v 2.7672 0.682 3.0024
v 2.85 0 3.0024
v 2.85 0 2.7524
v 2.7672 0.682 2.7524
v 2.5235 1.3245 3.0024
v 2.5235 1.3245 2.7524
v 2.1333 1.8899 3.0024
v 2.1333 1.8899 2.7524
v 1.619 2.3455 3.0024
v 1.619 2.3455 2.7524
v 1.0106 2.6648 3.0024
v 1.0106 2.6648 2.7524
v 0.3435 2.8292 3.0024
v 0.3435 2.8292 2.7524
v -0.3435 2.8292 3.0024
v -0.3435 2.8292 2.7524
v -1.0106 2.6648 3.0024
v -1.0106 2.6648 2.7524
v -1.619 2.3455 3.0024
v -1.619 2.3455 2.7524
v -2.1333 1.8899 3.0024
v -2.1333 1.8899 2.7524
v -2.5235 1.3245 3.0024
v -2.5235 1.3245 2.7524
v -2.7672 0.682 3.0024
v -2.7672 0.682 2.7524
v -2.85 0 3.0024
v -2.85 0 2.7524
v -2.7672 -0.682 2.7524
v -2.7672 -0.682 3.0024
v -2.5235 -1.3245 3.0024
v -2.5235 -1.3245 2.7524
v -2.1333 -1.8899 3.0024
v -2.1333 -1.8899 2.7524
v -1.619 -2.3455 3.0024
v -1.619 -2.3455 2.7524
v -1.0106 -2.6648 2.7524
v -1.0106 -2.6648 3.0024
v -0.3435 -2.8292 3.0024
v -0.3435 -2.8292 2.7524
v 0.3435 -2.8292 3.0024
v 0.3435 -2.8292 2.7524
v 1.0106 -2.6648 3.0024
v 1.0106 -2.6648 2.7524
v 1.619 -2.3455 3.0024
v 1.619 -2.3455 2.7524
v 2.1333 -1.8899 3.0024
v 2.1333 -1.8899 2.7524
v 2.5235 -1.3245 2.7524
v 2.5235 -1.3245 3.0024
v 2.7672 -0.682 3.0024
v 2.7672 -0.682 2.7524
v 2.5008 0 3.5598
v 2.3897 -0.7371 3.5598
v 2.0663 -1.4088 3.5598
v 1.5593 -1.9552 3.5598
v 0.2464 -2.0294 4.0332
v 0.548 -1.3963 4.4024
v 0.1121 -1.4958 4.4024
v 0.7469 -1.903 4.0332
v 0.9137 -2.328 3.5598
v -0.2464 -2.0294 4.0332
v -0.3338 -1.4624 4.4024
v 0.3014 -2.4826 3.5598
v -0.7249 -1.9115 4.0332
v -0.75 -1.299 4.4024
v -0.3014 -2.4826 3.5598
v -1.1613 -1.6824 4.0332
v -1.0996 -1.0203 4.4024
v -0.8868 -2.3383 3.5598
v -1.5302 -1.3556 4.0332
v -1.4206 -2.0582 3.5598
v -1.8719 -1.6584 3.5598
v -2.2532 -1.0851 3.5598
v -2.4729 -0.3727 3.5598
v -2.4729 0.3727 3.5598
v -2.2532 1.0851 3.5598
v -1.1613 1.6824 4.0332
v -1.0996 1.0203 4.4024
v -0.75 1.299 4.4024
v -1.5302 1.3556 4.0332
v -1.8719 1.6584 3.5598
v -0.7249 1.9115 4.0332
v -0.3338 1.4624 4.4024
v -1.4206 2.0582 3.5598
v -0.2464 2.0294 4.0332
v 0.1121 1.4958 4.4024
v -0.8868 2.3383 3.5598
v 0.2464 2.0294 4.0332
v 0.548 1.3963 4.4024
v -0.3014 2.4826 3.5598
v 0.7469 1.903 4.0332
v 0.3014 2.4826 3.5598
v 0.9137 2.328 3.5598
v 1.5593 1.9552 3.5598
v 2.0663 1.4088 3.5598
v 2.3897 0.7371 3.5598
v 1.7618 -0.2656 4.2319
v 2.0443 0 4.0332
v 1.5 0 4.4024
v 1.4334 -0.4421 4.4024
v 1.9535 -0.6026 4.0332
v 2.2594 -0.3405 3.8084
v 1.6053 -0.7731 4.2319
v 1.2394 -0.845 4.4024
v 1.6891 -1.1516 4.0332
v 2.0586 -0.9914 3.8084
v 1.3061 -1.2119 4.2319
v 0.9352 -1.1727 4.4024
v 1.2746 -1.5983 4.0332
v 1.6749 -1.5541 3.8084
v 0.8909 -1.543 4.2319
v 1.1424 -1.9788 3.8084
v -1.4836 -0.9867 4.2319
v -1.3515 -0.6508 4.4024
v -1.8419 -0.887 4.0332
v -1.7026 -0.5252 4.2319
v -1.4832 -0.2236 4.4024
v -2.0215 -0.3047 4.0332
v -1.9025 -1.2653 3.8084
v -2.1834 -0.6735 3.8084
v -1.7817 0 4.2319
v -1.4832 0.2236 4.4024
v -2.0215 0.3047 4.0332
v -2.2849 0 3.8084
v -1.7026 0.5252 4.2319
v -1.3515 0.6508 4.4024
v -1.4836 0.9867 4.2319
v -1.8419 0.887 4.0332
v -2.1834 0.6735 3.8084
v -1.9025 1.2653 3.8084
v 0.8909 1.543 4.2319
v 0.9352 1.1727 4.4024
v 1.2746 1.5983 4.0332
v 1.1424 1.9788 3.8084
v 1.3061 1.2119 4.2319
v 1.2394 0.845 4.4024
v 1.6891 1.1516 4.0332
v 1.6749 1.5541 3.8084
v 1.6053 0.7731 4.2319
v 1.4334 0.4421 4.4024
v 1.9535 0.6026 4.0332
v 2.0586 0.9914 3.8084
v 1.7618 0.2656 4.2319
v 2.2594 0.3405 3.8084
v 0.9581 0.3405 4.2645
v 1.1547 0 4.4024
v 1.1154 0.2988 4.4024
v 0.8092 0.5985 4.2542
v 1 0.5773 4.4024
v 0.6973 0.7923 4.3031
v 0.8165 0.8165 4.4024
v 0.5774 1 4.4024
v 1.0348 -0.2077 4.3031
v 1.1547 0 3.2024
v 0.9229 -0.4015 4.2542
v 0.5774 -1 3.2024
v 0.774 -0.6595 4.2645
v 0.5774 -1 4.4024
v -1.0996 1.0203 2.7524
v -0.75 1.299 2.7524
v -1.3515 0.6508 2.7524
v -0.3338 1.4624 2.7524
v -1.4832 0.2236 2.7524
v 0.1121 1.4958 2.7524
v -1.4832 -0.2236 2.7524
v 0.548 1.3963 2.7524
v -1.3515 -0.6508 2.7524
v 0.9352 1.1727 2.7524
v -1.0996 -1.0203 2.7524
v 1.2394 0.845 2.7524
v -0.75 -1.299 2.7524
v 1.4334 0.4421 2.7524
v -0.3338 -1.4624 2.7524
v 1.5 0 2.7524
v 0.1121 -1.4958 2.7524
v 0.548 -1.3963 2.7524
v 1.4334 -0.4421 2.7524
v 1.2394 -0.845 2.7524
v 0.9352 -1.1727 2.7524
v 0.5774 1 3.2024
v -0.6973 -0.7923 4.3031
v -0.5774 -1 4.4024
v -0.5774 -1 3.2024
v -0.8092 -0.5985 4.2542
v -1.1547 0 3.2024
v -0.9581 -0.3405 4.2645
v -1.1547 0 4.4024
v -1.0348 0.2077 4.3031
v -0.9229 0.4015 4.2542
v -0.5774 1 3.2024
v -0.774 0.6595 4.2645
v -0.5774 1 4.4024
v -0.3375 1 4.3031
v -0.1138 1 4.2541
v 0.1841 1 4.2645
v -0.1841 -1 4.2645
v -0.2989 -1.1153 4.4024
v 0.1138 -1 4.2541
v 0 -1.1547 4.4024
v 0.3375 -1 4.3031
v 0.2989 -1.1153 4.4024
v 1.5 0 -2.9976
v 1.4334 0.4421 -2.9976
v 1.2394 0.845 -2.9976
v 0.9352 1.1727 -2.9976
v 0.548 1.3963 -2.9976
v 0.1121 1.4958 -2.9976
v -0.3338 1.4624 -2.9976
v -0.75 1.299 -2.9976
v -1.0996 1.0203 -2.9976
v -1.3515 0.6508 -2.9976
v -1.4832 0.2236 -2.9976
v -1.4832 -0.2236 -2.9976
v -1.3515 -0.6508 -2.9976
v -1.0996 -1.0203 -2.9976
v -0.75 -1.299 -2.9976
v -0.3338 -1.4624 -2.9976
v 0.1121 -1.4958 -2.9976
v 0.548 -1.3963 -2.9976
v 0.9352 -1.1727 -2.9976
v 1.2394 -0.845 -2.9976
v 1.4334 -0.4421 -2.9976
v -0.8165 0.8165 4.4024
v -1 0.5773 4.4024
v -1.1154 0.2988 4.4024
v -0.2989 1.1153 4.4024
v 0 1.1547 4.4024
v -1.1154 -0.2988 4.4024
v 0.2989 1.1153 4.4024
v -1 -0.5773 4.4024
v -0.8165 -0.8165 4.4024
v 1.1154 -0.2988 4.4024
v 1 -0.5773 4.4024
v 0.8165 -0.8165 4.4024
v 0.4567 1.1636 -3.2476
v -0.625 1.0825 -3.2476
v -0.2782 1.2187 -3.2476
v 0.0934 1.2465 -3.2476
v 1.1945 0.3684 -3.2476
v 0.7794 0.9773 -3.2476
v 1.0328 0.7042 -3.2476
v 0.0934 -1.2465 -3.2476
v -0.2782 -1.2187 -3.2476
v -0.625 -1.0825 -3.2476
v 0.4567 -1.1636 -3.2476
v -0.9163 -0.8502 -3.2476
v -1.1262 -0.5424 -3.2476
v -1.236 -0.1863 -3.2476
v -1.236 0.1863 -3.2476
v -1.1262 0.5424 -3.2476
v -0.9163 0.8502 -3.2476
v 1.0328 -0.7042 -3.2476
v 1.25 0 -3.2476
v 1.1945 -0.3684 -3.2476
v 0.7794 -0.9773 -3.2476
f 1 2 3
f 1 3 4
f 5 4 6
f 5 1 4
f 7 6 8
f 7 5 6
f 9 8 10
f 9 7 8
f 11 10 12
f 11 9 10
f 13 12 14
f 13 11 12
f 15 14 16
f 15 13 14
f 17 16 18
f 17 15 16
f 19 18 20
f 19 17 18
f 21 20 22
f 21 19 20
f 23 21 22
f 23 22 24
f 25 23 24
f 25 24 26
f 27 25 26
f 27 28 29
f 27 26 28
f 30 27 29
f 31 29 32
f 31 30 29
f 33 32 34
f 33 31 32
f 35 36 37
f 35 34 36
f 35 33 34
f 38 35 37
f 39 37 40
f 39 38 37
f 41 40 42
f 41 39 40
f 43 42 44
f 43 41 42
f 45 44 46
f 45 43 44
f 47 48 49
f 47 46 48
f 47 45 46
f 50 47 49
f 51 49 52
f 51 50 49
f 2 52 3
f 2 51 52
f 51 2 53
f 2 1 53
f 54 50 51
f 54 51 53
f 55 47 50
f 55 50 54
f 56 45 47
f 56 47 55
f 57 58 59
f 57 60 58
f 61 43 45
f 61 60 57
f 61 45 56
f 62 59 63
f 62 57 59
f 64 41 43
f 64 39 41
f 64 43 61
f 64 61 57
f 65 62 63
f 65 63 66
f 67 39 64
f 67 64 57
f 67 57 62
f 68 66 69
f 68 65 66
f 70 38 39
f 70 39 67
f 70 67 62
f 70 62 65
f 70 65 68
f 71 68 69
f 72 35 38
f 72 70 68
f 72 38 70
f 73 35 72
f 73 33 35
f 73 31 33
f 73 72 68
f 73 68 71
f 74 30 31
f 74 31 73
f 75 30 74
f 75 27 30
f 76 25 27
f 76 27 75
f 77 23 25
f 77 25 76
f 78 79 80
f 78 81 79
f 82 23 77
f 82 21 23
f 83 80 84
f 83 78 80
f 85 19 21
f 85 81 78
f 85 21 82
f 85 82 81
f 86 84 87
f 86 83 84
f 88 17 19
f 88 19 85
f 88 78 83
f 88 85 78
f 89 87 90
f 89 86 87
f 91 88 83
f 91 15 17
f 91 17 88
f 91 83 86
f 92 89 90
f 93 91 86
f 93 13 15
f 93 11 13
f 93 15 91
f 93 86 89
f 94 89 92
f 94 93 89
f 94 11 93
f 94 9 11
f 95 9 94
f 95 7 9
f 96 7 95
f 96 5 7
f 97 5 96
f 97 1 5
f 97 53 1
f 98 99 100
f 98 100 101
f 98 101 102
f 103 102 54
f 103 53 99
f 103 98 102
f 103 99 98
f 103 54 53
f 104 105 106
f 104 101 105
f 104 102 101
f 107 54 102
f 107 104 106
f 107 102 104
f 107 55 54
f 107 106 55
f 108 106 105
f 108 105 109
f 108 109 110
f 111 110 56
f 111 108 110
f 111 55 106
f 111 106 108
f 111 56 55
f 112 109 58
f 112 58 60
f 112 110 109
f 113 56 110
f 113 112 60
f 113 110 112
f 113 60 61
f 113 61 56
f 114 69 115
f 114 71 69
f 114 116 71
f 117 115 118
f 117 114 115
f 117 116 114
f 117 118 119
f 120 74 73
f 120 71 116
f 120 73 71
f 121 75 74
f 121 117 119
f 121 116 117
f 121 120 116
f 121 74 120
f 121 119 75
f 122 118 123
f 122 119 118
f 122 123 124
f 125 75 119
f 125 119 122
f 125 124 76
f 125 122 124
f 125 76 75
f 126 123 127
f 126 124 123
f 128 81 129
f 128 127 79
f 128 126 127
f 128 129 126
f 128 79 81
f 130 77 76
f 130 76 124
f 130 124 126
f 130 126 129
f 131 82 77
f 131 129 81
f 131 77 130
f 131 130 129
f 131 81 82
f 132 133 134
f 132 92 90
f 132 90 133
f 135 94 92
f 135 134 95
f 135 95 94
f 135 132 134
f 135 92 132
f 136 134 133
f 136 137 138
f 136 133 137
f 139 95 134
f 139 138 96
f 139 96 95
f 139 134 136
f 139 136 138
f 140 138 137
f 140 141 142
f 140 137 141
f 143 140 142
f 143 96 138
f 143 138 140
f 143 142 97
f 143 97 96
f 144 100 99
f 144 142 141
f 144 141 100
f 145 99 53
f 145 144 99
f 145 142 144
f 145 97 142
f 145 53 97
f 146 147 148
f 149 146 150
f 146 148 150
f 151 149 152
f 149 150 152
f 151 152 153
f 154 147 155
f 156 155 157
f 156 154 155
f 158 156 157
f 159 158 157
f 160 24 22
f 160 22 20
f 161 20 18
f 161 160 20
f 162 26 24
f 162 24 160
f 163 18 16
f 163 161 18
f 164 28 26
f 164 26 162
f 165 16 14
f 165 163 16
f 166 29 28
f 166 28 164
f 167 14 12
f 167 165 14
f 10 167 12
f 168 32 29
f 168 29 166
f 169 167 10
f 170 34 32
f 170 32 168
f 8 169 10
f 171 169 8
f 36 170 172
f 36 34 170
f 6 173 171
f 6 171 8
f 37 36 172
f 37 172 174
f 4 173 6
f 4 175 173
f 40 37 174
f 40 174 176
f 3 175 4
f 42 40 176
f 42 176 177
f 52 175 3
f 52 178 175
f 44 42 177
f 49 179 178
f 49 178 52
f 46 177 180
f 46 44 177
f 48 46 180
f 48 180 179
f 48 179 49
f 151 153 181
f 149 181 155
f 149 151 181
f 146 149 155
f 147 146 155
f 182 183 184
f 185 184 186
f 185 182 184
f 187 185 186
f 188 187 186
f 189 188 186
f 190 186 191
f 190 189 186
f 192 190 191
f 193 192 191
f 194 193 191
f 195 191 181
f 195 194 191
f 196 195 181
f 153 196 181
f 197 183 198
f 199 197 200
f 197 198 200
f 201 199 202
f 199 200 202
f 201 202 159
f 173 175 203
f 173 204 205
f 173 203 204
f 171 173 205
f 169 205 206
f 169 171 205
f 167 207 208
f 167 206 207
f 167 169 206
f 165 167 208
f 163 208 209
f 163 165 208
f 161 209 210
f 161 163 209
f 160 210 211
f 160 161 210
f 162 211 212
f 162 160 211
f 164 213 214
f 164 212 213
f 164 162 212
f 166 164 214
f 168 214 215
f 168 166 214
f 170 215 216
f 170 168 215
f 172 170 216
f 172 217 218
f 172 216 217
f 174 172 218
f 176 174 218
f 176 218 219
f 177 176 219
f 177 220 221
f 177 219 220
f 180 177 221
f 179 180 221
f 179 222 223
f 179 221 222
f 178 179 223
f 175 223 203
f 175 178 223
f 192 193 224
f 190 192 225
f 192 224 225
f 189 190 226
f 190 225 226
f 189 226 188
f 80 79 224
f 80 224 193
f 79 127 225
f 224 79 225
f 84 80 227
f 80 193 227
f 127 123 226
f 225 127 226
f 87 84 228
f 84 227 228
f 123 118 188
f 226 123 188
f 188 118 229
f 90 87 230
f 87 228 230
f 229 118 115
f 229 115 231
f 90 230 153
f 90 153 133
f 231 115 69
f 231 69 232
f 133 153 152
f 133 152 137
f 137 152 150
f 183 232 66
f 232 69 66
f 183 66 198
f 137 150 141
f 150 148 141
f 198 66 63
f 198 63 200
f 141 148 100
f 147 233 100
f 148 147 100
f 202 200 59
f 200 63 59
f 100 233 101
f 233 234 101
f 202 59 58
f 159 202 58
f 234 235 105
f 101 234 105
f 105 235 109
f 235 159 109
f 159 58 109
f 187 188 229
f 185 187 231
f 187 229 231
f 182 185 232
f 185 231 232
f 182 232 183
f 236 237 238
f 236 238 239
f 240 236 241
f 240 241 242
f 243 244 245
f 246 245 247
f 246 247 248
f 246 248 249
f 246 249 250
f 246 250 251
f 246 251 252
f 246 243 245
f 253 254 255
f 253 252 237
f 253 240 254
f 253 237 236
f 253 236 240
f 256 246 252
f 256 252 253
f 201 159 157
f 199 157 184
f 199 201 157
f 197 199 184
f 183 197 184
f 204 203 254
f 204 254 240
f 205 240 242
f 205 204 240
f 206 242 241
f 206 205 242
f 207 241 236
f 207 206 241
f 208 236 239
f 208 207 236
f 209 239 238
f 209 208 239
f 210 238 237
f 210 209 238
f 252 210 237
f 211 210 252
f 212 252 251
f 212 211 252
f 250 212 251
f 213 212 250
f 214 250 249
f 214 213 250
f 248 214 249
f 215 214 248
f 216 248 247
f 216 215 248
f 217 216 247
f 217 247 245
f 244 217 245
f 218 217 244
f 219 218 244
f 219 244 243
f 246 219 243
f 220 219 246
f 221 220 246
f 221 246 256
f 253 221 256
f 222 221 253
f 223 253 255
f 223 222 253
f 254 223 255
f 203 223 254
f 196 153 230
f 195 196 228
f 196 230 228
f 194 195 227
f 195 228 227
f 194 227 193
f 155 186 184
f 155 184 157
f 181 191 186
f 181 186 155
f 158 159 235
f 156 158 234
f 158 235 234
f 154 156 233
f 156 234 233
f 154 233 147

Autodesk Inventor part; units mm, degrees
ref_plane "YZ Plane" through (0, 0, 0) normal (1, 0, 0) x (0, 1, 0)
ref_plane "XZ Plane" through (0, 0, 0) normal (0, 1, 0) x (-1, 0, 0)
ref_plane "XY Plane" through (0, 0, 0) normal (0, 0, 1) x (1, 0, 0)
sketch "Sketch1" plane through (0, 0, 0) normal (0, 1, 0) x (-1, 0, 0)
  line L0 (0, 3.2476) -> (0, -3.2476)
  line L1 (0, -3.2476) -> (-1.25, -3.2476)
  line L2 (-1.25, -3.2476) -> (-1.5, -2.9976)
  line L3 (-1.5, -2.9976) -> (-1.5, 2.7524)
  line L4 (-1.5, 2.7524) -> (-2.85, 2.7524)
  line L5 (-2.85, 2.7524) -> (-2.85, 3.0024)
  line L6 (0, 3.2476) -> (-1.1547, 4.4024)
  line L7 (-1.1547, 4.4024) -> (-1.5, 4.4024)
  arc A0 (-1.5, 4.4024) -> (-2.85, 3.0024) centre (0, 1.605) ccw
  line L8 (-1.1547, 4.4024) -> (-0.5774, 5.4024) construction
  line L9 (-0.5774, 5.4024) -> (0.5774, 5.4024) construction
  line L10 (0.5774, 5.4024) -> (1.1547, 4.4024) construction
  line L11 (1.1547, 4.4024) -> (0.5774, 3.4024) construction
  line L12 (0.5774, 3.4024) -> (-0.5774, 3.4024) construction
  line L13 (-0.5774, 3.4024) -> (-1.1547, 4.4024) construction
  point P0 (0, 0)
  point P1 (0, 0)
  point P2 (0, 4.4024)
  dimension "d0" = 3
  dimension "d1" = 6
  dimension "d2" = 0.25
  dimension "d3" = 135
  dimension "d4" = 5.7
  dimension "d5" = 3
  dimension "d6" = 1.65
  dimension "d7" = 2
  dimension "d8" = 0.25
revolve "Revolution1" add sketch "Sketch1" angle 360 about axis through (0, 0, 3.2476) along (0, 0, -1)
sketch "Sketch2" plane through (0, 0, 4.4024) normal (0, 0, 1) x (1, 0, 0)
  circle A0 centre (0, 0) radius 1.1547 projected
  circle A1 centre (0, 0) radius 1.5 projected
  line L0 (-1.1547, 0) -> (-0.5774, 1)
  line L1 (-0.5774, 1) -> (0.5774, 1)
  line L2 (0.5774, 1) -> (1.1547, 0)
  line L3 (1.1547, 0) -> (0.5774, -1)
  line L4 (0.5774, -1) -> (-0.5774, -1)
  line L5 (-0.5774, -1) -> (-1.1547, 0)
  point P0 (0, 0)
extrude "Extrusion1" cut sketch "Sketch2" against normal blind 1.2 contours L3 L4 L5 L0 L1 L2
thread "Thread1" size "M3x0.35" class "6g" standard "ANSI Metric M Profile" full length
properties part number "Bolt_M3x0.35_6mm_BH" material "Stainless Steel"
